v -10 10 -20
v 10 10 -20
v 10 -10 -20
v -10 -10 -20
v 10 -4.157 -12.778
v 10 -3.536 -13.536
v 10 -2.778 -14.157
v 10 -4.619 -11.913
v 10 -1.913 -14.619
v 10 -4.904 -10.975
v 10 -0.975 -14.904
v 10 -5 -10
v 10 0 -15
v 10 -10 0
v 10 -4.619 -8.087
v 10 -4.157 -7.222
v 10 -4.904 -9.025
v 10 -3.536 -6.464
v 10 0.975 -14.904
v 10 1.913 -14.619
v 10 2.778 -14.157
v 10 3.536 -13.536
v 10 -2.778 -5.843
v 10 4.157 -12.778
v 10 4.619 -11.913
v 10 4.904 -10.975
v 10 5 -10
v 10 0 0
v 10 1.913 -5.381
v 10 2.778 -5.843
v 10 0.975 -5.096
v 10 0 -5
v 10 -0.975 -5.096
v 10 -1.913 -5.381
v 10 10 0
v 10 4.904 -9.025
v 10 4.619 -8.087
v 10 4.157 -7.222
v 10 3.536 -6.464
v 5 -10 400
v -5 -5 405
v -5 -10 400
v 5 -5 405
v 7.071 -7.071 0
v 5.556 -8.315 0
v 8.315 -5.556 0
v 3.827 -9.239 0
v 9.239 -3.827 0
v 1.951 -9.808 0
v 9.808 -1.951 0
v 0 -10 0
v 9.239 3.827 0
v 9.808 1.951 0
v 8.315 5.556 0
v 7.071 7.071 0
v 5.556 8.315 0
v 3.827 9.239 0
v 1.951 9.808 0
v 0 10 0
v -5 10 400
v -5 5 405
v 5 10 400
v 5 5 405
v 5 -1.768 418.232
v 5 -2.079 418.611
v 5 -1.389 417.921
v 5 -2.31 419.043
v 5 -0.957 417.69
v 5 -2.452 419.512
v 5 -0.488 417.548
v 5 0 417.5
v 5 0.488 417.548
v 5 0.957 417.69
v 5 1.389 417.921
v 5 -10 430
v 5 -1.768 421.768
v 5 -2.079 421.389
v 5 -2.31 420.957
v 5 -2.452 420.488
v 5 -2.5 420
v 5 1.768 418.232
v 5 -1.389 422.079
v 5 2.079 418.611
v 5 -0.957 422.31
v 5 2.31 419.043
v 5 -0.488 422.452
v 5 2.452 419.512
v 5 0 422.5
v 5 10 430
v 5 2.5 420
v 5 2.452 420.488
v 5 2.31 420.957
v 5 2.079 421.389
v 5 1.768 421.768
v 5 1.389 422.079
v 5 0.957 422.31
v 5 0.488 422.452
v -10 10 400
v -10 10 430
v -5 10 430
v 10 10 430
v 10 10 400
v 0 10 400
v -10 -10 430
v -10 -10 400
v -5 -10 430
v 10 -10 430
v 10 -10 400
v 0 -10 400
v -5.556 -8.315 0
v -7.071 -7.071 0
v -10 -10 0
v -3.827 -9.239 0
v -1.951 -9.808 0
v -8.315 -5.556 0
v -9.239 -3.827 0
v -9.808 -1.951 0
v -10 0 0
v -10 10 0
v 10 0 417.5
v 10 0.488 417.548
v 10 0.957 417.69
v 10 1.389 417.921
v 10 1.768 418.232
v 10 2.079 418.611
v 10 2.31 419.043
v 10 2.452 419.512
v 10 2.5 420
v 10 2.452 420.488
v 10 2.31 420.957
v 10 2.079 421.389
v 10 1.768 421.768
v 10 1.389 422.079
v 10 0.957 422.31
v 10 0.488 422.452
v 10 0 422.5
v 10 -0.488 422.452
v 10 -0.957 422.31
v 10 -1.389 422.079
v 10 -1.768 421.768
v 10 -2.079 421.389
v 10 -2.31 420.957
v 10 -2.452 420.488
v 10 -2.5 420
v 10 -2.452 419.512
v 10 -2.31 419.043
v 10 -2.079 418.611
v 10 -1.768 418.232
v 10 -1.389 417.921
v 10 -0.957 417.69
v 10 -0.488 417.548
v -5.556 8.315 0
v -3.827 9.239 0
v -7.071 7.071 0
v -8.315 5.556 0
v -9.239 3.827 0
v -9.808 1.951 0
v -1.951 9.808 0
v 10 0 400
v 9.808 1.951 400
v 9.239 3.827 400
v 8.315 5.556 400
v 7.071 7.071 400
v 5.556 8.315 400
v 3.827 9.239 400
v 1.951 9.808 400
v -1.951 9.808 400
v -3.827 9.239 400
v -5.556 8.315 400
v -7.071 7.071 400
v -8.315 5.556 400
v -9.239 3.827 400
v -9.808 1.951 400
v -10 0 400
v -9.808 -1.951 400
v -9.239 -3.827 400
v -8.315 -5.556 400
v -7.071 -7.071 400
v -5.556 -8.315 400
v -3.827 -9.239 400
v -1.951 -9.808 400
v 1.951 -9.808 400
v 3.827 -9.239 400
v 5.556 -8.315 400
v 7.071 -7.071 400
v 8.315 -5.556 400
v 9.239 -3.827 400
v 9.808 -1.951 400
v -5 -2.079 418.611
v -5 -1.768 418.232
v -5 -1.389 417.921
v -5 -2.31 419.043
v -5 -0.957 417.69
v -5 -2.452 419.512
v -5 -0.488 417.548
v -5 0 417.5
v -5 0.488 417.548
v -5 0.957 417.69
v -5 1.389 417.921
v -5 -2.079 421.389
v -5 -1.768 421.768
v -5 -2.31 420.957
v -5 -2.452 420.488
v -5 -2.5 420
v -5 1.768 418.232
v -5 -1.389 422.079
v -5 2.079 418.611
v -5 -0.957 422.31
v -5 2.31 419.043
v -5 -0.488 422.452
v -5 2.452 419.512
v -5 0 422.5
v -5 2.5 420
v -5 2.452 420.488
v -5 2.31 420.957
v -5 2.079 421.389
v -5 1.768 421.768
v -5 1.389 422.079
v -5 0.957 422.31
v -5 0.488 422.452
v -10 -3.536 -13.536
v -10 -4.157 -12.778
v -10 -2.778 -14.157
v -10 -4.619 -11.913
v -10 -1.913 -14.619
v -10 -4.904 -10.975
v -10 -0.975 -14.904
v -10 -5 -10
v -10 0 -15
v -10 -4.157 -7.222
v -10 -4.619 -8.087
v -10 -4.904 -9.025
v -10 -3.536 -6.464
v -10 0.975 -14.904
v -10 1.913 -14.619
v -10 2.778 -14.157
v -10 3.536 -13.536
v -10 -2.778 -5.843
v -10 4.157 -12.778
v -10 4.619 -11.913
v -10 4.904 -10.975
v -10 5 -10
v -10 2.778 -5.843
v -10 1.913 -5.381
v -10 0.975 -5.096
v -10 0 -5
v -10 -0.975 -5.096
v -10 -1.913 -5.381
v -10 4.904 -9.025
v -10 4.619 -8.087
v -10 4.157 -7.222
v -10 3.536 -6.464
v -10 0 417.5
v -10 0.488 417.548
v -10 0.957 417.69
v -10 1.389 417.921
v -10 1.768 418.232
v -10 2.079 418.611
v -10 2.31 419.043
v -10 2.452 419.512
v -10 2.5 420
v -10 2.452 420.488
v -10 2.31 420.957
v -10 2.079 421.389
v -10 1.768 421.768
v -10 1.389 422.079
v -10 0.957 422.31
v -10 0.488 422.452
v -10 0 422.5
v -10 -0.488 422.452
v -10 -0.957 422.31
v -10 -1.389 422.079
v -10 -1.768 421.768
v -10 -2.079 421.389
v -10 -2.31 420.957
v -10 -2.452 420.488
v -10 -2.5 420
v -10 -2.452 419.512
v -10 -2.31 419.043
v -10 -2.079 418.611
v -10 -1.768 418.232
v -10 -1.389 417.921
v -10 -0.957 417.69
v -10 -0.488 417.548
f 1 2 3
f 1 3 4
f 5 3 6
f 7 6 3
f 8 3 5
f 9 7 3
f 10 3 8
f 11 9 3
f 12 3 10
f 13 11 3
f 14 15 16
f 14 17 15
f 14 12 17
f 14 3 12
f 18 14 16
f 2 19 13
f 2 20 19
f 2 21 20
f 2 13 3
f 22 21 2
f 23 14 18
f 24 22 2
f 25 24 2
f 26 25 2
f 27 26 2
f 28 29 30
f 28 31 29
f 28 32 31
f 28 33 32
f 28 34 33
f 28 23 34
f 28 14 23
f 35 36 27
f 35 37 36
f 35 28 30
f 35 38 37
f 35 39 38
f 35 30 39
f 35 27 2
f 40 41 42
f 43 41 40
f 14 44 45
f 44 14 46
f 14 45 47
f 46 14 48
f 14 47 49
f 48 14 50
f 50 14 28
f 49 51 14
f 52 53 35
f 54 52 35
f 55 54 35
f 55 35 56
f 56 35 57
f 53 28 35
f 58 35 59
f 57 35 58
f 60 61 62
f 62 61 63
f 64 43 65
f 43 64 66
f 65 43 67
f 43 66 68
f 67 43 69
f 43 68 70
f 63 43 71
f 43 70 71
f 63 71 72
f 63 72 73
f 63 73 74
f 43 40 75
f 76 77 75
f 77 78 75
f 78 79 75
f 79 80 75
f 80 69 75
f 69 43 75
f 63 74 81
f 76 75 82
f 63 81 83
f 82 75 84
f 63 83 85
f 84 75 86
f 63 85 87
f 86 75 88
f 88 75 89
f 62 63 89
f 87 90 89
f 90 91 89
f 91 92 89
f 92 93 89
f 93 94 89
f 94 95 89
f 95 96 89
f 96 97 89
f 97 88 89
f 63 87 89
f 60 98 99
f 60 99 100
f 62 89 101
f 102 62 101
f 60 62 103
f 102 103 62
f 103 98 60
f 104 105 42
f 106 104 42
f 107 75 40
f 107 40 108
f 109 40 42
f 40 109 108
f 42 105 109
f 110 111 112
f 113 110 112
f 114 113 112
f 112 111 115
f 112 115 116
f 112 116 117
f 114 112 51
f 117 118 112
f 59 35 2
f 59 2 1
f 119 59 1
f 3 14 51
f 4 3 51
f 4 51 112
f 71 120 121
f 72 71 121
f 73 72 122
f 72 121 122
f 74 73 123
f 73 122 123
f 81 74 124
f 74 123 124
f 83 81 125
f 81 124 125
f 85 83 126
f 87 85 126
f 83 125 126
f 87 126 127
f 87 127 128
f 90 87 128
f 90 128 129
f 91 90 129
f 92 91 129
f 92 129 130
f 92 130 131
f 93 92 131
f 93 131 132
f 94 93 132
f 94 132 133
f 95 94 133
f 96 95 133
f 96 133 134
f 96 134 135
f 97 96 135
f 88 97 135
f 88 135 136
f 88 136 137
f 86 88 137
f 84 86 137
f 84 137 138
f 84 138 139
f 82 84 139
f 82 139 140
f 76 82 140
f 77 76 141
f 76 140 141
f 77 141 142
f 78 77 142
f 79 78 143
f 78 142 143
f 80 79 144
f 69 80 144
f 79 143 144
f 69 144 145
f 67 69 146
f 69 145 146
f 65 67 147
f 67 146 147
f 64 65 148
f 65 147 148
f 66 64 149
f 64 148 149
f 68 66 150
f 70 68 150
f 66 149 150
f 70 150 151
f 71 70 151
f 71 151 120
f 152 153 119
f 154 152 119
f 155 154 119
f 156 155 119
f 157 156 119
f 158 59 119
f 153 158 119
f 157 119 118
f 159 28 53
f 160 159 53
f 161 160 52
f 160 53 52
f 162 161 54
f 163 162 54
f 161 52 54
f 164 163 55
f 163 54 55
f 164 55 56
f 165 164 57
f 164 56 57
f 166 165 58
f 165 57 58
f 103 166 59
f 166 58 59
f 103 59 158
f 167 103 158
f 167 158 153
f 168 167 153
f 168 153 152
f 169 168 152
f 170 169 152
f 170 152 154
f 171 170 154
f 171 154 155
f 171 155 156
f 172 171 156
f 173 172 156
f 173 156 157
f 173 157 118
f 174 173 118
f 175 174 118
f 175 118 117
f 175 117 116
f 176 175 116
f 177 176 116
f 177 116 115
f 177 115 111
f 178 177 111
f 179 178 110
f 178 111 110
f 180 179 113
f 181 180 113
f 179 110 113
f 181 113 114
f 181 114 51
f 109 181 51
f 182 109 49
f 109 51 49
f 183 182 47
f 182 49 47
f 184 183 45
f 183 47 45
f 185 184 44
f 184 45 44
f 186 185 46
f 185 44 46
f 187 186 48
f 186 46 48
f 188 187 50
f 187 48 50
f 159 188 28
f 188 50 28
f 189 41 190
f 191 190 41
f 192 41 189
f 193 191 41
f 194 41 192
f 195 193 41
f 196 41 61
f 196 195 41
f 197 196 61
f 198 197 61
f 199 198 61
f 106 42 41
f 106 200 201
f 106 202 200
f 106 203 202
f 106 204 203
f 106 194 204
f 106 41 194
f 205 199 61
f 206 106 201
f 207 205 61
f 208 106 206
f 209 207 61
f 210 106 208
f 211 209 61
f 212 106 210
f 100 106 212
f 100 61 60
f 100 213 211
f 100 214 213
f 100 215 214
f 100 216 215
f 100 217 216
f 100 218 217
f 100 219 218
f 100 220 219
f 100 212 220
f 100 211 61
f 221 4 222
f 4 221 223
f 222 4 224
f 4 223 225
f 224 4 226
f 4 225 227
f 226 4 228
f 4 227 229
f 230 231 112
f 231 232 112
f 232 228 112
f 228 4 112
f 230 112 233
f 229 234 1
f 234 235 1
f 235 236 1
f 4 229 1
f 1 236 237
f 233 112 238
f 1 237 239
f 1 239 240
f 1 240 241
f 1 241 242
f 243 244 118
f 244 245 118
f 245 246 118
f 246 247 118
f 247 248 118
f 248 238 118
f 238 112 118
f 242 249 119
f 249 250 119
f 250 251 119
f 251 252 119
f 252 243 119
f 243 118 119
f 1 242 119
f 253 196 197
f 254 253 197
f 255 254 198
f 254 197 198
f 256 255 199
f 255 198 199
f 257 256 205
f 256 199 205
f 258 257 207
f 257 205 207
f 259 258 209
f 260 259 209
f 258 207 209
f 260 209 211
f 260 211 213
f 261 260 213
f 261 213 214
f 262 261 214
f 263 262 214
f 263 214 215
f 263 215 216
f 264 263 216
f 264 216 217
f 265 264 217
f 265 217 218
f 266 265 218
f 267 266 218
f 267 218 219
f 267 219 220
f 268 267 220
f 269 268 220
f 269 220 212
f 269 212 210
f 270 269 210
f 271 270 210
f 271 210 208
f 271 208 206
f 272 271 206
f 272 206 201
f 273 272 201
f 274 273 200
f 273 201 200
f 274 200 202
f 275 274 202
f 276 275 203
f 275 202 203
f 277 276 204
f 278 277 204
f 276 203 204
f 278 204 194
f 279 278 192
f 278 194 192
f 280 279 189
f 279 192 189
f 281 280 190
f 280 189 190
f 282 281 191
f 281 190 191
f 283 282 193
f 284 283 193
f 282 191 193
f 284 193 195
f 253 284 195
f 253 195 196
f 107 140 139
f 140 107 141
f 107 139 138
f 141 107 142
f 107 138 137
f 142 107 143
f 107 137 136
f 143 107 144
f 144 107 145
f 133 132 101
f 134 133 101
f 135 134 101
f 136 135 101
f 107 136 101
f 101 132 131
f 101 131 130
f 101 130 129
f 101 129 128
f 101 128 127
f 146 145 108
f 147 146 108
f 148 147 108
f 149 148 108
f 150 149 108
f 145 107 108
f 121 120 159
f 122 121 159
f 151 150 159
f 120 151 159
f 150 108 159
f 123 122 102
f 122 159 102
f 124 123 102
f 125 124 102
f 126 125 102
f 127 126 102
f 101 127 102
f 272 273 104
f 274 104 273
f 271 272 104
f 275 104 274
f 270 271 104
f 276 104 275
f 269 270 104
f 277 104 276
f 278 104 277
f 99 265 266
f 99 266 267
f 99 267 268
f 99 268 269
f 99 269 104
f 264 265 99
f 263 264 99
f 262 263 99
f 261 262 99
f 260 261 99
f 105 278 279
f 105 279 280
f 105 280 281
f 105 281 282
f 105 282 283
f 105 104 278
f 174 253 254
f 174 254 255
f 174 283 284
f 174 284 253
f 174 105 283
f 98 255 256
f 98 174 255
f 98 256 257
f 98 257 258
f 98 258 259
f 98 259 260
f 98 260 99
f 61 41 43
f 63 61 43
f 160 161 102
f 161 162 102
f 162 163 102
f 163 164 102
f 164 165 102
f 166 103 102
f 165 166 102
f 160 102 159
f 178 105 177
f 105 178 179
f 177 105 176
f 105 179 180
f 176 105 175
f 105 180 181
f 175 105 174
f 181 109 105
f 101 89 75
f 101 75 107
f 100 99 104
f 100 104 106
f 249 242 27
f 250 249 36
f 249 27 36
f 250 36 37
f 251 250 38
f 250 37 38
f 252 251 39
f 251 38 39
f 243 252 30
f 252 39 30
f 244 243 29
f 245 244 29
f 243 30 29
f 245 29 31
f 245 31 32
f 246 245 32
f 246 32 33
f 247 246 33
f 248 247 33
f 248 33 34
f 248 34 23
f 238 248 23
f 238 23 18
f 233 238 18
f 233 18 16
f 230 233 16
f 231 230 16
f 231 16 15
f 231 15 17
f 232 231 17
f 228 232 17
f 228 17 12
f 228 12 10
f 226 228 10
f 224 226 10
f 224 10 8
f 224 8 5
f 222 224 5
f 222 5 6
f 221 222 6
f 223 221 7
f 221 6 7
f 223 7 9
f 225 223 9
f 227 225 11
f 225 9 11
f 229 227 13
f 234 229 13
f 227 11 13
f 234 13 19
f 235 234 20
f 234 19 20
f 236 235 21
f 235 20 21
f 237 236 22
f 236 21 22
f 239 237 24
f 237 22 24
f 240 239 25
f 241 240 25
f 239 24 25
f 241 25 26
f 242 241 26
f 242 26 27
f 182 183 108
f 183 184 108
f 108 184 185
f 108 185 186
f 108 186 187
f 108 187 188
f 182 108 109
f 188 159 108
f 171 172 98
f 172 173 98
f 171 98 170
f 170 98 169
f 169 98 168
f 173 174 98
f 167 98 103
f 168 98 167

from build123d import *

# Parameters (mm, degrees)
SKIZZE1_R                       = 10
AUFSATZ_LINEAR_AUSTRAGEN1_DEPTH = 400
SKIZZE2_W                       = 20
SKIZZE2_H                       = 20
AUFSATZ_LINEAR_AUSTRAGEN2_DEPTH = 20
SKIZZE3_R                       = 5
SCHNITT_LINEAR_AUSTRAGEN1_DEPTH = 30
SKIZZE4_W                       = 20
SKIZZE4_H                       = 20
AUFSATZ_LINEAR_AUSTRAGEN3_DEPTH = 30
SKIZZE5_W                       = 10
SKIZZE5_H                       = 20
SCHNITT_LINEAR_AUSTRAGEN2_DEPTH = 25
FASE1_SIZE                      = 5
SKIZZE6_R                       = 2.5
SCHNITT_LINEAR_AUSTRAGEN3_DEPTH = 25


with BuildPart() as part:
    # Skizze1 → Aufsatz-Linear austragen1 (new body)
    with BuildSketch(Plane.XY):
        Circle(SKIZZE1_R)
    extrude(amount=AUFSATZ_LINEAR_AUSTRAGEN1_DEPTH)

    # Skizze2 → Aufsatz-Linear austragen2 (add)
    with BuildSketch(Plane(origin=(0, 0, 0), x_dir=(-1, 0, 0), z_dir=(0, 0, -1))):
        Rectangle(SKIZZE2_W, SKIZZE2_H)
    extrude(amount=AUFSATZ_LINEAR_AUSTRAGEN2_DEPTH)

    # Skizze3 → Schnitt-Linear austragen1 (cut)
    with BuildSketch(Plane(origin=(10, 0, 0), x_dir=(0, 0, -1), z_dir=(1, 0, 0))):
        with Locations(Location((10, 0, 0), (0, 0, 90))):
            Circle(SKIZZE3_R)
    extrude(amount=-SCHNITT_LINEAR_AUSTRAGEN1_DEPTH, mode=Mode.SUBTRACT)

    # Skizze4 → Aufsatz-Linear austragen3 (add)
    with BuildSketch(Plane.XY.offset(400)):
        Rectangle(SKIZZE4_W, SKIZZE4_H)
    extrude(amount=AUFSATZ_LINEAR_AUSTRAGEN3_DEPTH)

    # Skizze5 → Schnitt-Linear austragen2 (cut)
    with BuildSketch(Plane.XY.offset(430)):
        Rectangle(SKIZZE5_W, SKIZZE5_H)
    extrude(amount=-SCHNITT_LINEAR_AUSTRAGEN2_DEPTH, mode=Mode.SUBTRACT)

    # Fase1
    fase1_edges = [part.edges().sort_by_distance(p)[0] for p in [
        (0, -10, 405),
        (0, 10, 405),
    ]]
    chamfer(fase1_edges, length=FASE1_SIZE - 0.0001)  # a hair under: the kernel refuses the full size

    # Skizze6 → Schnitt-Linear austragen3 (cut)
    with BuildSketch(Plane(origin=(10, 0, 0), x_dir=(0, 0, -1), z_dir=(1, 0, 0))):
        with Locations((-420, 0)):
            Circle(SKIZZE6_R)
    extrude(amount=-SCHNITT_LINEAR_AUSTRAGEN3_DEPTH, mode=Mode.SUBTRACT)


solid = part.part
